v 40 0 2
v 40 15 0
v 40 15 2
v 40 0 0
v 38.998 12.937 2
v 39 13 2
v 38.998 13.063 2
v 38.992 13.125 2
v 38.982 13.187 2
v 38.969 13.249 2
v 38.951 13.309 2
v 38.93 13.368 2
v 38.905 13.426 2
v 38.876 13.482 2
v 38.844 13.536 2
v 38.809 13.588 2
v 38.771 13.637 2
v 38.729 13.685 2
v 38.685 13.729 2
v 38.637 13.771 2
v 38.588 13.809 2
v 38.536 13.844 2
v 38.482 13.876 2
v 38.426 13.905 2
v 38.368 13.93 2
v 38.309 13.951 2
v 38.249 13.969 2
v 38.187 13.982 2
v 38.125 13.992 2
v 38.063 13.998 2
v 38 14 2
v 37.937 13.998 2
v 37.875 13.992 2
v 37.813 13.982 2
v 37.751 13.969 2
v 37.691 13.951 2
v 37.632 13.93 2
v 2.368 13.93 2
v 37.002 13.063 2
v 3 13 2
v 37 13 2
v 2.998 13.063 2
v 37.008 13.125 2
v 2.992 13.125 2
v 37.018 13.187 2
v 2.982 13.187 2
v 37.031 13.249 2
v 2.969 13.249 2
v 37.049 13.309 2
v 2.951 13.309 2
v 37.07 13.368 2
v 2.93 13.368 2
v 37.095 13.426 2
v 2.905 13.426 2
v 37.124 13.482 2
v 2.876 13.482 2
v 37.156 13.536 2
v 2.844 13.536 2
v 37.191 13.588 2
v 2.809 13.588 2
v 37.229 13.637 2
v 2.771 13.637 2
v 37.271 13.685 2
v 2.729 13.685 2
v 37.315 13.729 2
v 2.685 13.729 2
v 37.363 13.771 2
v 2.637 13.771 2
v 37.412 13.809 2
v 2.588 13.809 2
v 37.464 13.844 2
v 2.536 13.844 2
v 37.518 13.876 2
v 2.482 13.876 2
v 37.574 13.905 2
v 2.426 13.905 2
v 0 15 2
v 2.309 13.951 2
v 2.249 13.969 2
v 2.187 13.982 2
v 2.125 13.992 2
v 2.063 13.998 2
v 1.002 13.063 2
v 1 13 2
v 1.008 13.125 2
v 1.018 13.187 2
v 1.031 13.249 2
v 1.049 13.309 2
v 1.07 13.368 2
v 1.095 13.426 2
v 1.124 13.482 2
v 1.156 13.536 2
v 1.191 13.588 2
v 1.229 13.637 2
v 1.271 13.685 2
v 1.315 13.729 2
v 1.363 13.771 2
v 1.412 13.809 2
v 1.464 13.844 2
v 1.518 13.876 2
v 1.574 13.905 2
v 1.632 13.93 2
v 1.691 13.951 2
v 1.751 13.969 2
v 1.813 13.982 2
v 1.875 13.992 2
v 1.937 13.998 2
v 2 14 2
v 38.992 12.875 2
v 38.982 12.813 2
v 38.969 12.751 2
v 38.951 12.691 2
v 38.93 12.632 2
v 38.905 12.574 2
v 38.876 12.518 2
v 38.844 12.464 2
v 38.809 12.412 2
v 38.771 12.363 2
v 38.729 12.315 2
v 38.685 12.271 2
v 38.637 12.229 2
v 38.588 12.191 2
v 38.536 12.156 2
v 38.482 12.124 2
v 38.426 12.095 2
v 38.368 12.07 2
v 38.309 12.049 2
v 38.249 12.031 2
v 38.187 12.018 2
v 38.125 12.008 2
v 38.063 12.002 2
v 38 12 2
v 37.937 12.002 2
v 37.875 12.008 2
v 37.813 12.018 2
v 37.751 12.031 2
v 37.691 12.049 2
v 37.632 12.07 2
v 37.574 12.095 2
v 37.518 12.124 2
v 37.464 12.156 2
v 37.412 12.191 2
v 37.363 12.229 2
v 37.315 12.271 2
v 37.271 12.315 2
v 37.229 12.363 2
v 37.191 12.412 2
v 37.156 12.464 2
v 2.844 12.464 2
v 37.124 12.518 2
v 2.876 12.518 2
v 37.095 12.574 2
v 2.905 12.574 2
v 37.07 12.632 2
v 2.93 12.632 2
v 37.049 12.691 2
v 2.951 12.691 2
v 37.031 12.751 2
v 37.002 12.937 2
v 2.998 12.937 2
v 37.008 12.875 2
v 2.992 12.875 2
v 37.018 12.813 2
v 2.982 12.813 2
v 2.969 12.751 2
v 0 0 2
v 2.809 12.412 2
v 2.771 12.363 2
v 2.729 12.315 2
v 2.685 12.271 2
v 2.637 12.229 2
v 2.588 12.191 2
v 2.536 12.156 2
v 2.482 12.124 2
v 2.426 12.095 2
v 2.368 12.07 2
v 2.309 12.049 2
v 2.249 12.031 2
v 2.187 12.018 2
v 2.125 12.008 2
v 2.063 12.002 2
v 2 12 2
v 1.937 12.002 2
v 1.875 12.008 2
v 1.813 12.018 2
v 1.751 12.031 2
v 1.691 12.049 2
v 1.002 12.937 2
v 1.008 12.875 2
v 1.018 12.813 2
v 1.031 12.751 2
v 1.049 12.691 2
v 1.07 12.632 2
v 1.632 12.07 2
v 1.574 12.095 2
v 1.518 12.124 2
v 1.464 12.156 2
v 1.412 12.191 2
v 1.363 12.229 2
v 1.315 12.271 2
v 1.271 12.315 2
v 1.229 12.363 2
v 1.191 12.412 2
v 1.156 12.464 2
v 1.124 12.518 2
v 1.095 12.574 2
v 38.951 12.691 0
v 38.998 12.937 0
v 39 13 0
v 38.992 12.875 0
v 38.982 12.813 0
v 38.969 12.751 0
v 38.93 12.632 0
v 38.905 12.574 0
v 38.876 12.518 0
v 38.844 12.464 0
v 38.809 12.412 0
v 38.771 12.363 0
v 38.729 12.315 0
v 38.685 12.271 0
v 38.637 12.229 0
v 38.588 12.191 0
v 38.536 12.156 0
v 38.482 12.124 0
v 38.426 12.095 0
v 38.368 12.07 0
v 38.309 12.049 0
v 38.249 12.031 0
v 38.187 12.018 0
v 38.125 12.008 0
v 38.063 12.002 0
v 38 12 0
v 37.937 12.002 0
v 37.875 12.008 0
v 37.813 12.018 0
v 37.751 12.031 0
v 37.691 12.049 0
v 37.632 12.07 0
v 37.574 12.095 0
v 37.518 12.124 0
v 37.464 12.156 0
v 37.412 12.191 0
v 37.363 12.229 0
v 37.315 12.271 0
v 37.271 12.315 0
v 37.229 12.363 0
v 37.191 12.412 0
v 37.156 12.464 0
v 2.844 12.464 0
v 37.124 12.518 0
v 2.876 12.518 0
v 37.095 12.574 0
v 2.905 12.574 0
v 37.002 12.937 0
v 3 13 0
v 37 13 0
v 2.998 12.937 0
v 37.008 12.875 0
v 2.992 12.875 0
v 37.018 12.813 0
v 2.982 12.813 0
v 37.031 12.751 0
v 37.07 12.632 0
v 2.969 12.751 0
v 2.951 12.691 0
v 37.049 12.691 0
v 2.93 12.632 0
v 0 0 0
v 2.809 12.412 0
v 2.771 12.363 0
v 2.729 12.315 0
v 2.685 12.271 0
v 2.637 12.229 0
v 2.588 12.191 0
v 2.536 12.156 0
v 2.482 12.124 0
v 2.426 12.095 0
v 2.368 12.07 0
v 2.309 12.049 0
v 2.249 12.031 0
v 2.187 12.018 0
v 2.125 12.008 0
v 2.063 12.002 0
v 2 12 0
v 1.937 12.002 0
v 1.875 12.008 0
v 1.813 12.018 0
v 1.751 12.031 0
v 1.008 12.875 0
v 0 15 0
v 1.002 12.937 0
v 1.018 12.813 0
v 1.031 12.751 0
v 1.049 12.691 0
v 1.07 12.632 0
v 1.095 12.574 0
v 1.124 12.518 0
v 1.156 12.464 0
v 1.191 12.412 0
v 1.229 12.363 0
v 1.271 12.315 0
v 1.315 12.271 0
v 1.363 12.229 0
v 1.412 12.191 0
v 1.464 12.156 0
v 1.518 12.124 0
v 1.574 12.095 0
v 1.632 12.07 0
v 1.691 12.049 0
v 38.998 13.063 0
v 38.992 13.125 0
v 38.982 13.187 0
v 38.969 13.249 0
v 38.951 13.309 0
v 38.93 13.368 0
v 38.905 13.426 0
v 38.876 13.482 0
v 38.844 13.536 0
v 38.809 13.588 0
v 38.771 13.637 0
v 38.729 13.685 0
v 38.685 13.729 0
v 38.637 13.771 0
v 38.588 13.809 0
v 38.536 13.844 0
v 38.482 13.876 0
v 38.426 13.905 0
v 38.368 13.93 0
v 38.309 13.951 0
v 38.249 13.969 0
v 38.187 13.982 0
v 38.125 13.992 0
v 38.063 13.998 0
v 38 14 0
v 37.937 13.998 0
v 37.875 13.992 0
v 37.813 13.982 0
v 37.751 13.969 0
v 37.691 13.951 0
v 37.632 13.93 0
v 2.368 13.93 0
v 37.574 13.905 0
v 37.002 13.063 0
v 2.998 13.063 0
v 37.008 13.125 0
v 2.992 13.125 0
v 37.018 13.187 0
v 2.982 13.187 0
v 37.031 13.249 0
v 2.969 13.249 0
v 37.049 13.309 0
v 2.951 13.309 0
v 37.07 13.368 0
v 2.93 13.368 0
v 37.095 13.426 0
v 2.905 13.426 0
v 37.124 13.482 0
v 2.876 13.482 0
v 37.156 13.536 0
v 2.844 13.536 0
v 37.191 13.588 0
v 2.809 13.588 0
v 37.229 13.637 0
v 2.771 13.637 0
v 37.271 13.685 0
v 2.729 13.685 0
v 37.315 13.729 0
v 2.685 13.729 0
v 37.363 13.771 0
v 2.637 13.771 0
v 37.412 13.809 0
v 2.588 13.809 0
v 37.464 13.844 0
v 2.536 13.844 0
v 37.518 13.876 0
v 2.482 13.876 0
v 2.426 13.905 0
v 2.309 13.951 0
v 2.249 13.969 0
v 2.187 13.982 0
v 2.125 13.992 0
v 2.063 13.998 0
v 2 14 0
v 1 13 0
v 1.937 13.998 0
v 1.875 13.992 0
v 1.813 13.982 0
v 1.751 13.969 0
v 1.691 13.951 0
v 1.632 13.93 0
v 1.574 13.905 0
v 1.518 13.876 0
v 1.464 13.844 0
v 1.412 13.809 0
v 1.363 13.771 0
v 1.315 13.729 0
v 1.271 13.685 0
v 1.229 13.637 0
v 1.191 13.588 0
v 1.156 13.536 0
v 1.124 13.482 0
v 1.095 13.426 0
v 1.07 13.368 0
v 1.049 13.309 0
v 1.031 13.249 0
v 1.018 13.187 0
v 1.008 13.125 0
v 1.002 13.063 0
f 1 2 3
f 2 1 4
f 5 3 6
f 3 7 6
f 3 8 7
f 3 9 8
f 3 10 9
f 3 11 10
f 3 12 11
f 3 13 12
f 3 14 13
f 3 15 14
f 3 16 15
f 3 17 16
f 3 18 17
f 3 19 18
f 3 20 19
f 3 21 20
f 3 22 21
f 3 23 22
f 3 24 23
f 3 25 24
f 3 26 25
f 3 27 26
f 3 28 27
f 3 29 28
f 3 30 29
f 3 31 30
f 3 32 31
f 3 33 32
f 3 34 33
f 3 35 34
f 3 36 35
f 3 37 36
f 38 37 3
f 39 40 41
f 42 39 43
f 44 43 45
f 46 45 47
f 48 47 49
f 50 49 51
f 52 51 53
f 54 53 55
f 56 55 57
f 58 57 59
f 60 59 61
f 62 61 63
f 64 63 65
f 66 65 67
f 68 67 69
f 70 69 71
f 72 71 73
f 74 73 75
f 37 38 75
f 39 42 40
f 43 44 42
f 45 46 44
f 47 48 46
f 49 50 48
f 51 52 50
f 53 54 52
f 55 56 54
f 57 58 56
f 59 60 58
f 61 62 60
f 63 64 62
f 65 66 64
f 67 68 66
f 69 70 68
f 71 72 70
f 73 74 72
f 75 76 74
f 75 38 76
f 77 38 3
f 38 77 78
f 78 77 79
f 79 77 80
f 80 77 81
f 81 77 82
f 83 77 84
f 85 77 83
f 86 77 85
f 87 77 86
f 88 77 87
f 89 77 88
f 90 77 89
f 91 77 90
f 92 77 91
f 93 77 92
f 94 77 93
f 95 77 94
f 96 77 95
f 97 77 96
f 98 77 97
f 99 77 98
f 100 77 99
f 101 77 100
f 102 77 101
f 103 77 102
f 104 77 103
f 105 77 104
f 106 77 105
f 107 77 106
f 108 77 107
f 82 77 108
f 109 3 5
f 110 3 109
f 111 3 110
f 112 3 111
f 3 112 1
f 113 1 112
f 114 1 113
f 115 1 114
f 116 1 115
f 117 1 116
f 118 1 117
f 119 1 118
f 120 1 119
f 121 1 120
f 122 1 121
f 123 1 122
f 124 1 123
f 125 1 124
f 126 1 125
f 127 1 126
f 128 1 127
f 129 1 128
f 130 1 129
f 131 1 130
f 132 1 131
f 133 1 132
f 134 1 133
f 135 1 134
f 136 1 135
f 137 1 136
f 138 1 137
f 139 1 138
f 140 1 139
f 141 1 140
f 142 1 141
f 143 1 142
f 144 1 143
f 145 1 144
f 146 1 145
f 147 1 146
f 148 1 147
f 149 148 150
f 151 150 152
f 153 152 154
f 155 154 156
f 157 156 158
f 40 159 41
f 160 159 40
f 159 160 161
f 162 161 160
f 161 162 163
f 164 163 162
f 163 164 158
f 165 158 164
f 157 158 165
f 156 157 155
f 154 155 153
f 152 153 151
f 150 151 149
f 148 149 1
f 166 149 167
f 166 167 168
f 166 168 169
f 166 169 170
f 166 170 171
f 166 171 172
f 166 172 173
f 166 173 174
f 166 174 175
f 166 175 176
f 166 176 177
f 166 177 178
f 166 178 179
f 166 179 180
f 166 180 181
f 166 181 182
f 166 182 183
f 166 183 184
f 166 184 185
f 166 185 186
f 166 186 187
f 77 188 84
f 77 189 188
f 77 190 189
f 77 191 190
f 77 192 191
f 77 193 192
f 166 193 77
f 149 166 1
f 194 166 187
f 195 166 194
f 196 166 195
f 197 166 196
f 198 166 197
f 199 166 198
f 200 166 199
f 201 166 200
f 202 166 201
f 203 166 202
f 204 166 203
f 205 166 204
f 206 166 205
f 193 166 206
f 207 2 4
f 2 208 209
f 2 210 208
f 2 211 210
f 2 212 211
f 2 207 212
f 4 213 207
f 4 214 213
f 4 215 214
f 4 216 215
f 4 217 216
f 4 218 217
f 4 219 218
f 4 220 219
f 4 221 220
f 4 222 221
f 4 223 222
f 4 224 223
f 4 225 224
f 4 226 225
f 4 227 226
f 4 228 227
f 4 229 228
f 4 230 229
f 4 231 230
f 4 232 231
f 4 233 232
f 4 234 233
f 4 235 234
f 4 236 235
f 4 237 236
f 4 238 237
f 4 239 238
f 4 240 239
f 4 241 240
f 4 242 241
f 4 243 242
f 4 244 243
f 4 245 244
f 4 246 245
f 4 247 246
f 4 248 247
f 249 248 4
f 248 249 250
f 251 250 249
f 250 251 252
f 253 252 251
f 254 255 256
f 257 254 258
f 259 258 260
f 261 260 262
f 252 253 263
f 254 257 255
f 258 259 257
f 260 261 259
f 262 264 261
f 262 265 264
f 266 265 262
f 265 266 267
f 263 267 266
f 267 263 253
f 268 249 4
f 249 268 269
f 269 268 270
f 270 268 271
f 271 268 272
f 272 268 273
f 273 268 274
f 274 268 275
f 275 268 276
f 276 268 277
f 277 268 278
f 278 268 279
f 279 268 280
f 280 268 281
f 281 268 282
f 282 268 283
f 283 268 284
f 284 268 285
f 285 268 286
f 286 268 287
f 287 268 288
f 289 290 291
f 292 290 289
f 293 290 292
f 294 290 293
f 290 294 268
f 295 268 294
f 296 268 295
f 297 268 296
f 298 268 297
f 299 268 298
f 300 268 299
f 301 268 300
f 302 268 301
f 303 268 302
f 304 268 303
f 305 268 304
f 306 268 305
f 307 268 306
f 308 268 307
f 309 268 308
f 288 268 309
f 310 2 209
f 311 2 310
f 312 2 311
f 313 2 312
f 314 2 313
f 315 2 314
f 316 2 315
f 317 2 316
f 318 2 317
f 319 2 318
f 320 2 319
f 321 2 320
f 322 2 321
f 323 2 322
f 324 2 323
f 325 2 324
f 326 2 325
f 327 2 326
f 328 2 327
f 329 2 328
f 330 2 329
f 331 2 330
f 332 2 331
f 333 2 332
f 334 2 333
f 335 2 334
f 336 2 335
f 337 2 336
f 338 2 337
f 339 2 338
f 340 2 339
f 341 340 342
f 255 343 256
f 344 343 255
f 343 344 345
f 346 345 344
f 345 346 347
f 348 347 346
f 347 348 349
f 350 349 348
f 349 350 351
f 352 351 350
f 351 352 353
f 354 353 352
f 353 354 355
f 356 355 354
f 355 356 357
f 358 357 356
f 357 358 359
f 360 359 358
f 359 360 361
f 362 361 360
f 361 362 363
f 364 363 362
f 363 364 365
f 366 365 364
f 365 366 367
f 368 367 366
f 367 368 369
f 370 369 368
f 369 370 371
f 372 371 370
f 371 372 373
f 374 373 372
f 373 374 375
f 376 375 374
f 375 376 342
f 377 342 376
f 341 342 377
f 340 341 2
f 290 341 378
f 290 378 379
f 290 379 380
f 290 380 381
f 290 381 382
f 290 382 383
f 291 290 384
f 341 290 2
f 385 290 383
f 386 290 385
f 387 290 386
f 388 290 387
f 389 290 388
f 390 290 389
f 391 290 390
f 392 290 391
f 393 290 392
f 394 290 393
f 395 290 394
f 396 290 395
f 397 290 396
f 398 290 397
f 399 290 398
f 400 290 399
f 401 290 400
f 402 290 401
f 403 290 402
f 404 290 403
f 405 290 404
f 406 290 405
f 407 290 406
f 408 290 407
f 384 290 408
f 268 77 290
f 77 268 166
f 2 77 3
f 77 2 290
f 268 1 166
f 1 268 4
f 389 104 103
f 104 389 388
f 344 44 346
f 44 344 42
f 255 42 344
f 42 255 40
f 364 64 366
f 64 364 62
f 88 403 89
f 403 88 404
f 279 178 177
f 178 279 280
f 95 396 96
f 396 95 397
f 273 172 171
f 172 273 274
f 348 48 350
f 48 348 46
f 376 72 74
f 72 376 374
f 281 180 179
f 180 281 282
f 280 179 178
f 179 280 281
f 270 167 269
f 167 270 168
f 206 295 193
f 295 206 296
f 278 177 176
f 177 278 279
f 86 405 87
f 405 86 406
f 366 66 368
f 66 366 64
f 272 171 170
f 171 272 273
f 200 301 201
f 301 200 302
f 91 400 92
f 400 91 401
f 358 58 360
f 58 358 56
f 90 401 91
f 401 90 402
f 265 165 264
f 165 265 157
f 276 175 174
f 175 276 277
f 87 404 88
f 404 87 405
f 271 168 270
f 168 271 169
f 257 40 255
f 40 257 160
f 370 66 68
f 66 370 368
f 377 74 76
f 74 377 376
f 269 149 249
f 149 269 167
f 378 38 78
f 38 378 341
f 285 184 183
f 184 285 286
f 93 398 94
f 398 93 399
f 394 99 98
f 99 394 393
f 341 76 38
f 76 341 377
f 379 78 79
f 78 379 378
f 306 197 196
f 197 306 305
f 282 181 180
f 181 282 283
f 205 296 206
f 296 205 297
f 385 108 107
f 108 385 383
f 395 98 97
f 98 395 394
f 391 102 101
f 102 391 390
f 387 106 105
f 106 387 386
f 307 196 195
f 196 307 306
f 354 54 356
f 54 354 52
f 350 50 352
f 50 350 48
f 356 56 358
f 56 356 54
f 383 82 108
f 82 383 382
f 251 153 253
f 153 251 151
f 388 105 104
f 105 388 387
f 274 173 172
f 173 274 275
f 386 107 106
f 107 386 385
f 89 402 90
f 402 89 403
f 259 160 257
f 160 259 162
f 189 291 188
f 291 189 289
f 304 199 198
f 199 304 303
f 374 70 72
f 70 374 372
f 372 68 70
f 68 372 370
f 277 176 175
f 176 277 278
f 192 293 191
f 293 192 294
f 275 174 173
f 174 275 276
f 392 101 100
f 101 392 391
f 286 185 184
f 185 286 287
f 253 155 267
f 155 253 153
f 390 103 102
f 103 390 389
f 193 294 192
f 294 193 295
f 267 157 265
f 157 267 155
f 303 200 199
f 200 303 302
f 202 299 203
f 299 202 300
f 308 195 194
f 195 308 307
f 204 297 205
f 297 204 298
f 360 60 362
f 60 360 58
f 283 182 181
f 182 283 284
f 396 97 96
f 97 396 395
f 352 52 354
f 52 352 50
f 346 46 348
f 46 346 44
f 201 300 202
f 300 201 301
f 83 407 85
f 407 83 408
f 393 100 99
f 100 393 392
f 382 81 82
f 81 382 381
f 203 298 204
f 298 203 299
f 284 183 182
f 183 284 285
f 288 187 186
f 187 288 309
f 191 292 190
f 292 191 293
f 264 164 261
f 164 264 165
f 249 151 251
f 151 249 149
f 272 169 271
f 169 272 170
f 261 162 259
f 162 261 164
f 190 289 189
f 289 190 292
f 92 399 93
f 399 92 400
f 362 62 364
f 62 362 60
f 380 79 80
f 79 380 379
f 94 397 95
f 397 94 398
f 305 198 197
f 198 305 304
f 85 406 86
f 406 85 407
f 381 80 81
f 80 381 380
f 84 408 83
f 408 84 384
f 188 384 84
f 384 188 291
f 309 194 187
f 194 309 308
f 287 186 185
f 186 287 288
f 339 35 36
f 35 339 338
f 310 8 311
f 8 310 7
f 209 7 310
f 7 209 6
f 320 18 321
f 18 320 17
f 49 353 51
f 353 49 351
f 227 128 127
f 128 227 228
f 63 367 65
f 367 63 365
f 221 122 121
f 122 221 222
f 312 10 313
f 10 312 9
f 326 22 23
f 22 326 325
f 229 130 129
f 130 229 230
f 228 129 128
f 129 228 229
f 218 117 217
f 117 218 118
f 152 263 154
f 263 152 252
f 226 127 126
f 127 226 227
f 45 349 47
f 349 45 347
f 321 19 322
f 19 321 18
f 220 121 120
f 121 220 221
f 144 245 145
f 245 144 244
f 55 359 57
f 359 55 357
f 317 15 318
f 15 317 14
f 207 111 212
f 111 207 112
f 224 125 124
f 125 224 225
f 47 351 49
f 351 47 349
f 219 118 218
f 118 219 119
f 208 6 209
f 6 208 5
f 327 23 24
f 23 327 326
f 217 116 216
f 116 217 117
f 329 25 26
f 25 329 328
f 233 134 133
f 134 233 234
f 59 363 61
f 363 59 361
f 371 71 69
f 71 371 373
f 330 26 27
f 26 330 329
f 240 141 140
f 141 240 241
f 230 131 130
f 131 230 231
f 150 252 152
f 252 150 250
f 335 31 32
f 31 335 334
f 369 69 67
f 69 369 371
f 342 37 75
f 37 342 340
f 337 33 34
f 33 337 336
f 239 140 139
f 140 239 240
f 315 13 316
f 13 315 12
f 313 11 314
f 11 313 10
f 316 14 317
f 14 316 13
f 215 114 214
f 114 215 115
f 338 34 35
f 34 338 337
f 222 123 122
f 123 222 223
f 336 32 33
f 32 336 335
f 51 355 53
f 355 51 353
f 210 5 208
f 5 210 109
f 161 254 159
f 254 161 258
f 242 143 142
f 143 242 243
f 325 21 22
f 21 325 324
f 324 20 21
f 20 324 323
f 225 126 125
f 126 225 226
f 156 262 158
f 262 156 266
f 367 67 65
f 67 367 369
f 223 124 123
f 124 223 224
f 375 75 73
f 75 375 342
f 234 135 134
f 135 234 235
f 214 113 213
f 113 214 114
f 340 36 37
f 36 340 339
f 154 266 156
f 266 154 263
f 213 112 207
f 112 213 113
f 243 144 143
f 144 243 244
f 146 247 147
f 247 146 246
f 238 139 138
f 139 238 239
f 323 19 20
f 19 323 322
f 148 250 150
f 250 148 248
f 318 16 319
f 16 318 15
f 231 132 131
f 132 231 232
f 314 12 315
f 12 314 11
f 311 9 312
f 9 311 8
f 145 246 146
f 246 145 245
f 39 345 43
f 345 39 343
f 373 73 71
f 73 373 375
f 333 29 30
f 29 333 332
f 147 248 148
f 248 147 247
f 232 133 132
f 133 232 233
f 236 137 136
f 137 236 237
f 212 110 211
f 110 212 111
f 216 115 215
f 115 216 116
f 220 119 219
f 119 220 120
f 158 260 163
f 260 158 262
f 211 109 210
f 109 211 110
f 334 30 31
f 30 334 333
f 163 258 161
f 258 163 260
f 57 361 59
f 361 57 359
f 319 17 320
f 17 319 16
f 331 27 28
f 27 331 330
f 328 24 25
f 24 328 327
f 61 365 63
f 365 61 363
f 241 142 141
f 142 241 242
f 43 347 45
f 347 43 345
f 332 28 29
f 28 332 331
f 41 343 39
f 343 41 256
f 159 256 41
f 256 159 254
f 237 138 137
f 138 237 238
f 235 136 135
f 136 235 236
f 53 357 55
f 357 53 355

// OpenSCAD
use <WriteScad/write.scad>;

// write on a cube
module nametag() {
		translate([0,0,0]);
		//difference() {
				difference() {
						cube([40,15,2]);
						translate([2, 13, -1]) cylinder(h = 8, r=1, $fn=100);
						translate([38, 13, -1]) cylinder(h = 8, r=1, $fn=100);
				}
				//translate([3, 2.5, 1]) cube([34, 10, 2]);
		//}
}

module name() {
		writecube("HUNTER",[20,8,1],[40,30,2],face="top",h=8);
		writecube("HLH",[20,8,1],[40,30,1.01],face="bottom",h=8);
}

module ASide() {
		difference () {
			nametag();
			intersection() {
				nametag();
				name();
			}
		}
}

module BSide() {
		difference() {
			name();
			intersection() {
				nametag();
				name();
			}
		}
}


ASide();
//BSide();
